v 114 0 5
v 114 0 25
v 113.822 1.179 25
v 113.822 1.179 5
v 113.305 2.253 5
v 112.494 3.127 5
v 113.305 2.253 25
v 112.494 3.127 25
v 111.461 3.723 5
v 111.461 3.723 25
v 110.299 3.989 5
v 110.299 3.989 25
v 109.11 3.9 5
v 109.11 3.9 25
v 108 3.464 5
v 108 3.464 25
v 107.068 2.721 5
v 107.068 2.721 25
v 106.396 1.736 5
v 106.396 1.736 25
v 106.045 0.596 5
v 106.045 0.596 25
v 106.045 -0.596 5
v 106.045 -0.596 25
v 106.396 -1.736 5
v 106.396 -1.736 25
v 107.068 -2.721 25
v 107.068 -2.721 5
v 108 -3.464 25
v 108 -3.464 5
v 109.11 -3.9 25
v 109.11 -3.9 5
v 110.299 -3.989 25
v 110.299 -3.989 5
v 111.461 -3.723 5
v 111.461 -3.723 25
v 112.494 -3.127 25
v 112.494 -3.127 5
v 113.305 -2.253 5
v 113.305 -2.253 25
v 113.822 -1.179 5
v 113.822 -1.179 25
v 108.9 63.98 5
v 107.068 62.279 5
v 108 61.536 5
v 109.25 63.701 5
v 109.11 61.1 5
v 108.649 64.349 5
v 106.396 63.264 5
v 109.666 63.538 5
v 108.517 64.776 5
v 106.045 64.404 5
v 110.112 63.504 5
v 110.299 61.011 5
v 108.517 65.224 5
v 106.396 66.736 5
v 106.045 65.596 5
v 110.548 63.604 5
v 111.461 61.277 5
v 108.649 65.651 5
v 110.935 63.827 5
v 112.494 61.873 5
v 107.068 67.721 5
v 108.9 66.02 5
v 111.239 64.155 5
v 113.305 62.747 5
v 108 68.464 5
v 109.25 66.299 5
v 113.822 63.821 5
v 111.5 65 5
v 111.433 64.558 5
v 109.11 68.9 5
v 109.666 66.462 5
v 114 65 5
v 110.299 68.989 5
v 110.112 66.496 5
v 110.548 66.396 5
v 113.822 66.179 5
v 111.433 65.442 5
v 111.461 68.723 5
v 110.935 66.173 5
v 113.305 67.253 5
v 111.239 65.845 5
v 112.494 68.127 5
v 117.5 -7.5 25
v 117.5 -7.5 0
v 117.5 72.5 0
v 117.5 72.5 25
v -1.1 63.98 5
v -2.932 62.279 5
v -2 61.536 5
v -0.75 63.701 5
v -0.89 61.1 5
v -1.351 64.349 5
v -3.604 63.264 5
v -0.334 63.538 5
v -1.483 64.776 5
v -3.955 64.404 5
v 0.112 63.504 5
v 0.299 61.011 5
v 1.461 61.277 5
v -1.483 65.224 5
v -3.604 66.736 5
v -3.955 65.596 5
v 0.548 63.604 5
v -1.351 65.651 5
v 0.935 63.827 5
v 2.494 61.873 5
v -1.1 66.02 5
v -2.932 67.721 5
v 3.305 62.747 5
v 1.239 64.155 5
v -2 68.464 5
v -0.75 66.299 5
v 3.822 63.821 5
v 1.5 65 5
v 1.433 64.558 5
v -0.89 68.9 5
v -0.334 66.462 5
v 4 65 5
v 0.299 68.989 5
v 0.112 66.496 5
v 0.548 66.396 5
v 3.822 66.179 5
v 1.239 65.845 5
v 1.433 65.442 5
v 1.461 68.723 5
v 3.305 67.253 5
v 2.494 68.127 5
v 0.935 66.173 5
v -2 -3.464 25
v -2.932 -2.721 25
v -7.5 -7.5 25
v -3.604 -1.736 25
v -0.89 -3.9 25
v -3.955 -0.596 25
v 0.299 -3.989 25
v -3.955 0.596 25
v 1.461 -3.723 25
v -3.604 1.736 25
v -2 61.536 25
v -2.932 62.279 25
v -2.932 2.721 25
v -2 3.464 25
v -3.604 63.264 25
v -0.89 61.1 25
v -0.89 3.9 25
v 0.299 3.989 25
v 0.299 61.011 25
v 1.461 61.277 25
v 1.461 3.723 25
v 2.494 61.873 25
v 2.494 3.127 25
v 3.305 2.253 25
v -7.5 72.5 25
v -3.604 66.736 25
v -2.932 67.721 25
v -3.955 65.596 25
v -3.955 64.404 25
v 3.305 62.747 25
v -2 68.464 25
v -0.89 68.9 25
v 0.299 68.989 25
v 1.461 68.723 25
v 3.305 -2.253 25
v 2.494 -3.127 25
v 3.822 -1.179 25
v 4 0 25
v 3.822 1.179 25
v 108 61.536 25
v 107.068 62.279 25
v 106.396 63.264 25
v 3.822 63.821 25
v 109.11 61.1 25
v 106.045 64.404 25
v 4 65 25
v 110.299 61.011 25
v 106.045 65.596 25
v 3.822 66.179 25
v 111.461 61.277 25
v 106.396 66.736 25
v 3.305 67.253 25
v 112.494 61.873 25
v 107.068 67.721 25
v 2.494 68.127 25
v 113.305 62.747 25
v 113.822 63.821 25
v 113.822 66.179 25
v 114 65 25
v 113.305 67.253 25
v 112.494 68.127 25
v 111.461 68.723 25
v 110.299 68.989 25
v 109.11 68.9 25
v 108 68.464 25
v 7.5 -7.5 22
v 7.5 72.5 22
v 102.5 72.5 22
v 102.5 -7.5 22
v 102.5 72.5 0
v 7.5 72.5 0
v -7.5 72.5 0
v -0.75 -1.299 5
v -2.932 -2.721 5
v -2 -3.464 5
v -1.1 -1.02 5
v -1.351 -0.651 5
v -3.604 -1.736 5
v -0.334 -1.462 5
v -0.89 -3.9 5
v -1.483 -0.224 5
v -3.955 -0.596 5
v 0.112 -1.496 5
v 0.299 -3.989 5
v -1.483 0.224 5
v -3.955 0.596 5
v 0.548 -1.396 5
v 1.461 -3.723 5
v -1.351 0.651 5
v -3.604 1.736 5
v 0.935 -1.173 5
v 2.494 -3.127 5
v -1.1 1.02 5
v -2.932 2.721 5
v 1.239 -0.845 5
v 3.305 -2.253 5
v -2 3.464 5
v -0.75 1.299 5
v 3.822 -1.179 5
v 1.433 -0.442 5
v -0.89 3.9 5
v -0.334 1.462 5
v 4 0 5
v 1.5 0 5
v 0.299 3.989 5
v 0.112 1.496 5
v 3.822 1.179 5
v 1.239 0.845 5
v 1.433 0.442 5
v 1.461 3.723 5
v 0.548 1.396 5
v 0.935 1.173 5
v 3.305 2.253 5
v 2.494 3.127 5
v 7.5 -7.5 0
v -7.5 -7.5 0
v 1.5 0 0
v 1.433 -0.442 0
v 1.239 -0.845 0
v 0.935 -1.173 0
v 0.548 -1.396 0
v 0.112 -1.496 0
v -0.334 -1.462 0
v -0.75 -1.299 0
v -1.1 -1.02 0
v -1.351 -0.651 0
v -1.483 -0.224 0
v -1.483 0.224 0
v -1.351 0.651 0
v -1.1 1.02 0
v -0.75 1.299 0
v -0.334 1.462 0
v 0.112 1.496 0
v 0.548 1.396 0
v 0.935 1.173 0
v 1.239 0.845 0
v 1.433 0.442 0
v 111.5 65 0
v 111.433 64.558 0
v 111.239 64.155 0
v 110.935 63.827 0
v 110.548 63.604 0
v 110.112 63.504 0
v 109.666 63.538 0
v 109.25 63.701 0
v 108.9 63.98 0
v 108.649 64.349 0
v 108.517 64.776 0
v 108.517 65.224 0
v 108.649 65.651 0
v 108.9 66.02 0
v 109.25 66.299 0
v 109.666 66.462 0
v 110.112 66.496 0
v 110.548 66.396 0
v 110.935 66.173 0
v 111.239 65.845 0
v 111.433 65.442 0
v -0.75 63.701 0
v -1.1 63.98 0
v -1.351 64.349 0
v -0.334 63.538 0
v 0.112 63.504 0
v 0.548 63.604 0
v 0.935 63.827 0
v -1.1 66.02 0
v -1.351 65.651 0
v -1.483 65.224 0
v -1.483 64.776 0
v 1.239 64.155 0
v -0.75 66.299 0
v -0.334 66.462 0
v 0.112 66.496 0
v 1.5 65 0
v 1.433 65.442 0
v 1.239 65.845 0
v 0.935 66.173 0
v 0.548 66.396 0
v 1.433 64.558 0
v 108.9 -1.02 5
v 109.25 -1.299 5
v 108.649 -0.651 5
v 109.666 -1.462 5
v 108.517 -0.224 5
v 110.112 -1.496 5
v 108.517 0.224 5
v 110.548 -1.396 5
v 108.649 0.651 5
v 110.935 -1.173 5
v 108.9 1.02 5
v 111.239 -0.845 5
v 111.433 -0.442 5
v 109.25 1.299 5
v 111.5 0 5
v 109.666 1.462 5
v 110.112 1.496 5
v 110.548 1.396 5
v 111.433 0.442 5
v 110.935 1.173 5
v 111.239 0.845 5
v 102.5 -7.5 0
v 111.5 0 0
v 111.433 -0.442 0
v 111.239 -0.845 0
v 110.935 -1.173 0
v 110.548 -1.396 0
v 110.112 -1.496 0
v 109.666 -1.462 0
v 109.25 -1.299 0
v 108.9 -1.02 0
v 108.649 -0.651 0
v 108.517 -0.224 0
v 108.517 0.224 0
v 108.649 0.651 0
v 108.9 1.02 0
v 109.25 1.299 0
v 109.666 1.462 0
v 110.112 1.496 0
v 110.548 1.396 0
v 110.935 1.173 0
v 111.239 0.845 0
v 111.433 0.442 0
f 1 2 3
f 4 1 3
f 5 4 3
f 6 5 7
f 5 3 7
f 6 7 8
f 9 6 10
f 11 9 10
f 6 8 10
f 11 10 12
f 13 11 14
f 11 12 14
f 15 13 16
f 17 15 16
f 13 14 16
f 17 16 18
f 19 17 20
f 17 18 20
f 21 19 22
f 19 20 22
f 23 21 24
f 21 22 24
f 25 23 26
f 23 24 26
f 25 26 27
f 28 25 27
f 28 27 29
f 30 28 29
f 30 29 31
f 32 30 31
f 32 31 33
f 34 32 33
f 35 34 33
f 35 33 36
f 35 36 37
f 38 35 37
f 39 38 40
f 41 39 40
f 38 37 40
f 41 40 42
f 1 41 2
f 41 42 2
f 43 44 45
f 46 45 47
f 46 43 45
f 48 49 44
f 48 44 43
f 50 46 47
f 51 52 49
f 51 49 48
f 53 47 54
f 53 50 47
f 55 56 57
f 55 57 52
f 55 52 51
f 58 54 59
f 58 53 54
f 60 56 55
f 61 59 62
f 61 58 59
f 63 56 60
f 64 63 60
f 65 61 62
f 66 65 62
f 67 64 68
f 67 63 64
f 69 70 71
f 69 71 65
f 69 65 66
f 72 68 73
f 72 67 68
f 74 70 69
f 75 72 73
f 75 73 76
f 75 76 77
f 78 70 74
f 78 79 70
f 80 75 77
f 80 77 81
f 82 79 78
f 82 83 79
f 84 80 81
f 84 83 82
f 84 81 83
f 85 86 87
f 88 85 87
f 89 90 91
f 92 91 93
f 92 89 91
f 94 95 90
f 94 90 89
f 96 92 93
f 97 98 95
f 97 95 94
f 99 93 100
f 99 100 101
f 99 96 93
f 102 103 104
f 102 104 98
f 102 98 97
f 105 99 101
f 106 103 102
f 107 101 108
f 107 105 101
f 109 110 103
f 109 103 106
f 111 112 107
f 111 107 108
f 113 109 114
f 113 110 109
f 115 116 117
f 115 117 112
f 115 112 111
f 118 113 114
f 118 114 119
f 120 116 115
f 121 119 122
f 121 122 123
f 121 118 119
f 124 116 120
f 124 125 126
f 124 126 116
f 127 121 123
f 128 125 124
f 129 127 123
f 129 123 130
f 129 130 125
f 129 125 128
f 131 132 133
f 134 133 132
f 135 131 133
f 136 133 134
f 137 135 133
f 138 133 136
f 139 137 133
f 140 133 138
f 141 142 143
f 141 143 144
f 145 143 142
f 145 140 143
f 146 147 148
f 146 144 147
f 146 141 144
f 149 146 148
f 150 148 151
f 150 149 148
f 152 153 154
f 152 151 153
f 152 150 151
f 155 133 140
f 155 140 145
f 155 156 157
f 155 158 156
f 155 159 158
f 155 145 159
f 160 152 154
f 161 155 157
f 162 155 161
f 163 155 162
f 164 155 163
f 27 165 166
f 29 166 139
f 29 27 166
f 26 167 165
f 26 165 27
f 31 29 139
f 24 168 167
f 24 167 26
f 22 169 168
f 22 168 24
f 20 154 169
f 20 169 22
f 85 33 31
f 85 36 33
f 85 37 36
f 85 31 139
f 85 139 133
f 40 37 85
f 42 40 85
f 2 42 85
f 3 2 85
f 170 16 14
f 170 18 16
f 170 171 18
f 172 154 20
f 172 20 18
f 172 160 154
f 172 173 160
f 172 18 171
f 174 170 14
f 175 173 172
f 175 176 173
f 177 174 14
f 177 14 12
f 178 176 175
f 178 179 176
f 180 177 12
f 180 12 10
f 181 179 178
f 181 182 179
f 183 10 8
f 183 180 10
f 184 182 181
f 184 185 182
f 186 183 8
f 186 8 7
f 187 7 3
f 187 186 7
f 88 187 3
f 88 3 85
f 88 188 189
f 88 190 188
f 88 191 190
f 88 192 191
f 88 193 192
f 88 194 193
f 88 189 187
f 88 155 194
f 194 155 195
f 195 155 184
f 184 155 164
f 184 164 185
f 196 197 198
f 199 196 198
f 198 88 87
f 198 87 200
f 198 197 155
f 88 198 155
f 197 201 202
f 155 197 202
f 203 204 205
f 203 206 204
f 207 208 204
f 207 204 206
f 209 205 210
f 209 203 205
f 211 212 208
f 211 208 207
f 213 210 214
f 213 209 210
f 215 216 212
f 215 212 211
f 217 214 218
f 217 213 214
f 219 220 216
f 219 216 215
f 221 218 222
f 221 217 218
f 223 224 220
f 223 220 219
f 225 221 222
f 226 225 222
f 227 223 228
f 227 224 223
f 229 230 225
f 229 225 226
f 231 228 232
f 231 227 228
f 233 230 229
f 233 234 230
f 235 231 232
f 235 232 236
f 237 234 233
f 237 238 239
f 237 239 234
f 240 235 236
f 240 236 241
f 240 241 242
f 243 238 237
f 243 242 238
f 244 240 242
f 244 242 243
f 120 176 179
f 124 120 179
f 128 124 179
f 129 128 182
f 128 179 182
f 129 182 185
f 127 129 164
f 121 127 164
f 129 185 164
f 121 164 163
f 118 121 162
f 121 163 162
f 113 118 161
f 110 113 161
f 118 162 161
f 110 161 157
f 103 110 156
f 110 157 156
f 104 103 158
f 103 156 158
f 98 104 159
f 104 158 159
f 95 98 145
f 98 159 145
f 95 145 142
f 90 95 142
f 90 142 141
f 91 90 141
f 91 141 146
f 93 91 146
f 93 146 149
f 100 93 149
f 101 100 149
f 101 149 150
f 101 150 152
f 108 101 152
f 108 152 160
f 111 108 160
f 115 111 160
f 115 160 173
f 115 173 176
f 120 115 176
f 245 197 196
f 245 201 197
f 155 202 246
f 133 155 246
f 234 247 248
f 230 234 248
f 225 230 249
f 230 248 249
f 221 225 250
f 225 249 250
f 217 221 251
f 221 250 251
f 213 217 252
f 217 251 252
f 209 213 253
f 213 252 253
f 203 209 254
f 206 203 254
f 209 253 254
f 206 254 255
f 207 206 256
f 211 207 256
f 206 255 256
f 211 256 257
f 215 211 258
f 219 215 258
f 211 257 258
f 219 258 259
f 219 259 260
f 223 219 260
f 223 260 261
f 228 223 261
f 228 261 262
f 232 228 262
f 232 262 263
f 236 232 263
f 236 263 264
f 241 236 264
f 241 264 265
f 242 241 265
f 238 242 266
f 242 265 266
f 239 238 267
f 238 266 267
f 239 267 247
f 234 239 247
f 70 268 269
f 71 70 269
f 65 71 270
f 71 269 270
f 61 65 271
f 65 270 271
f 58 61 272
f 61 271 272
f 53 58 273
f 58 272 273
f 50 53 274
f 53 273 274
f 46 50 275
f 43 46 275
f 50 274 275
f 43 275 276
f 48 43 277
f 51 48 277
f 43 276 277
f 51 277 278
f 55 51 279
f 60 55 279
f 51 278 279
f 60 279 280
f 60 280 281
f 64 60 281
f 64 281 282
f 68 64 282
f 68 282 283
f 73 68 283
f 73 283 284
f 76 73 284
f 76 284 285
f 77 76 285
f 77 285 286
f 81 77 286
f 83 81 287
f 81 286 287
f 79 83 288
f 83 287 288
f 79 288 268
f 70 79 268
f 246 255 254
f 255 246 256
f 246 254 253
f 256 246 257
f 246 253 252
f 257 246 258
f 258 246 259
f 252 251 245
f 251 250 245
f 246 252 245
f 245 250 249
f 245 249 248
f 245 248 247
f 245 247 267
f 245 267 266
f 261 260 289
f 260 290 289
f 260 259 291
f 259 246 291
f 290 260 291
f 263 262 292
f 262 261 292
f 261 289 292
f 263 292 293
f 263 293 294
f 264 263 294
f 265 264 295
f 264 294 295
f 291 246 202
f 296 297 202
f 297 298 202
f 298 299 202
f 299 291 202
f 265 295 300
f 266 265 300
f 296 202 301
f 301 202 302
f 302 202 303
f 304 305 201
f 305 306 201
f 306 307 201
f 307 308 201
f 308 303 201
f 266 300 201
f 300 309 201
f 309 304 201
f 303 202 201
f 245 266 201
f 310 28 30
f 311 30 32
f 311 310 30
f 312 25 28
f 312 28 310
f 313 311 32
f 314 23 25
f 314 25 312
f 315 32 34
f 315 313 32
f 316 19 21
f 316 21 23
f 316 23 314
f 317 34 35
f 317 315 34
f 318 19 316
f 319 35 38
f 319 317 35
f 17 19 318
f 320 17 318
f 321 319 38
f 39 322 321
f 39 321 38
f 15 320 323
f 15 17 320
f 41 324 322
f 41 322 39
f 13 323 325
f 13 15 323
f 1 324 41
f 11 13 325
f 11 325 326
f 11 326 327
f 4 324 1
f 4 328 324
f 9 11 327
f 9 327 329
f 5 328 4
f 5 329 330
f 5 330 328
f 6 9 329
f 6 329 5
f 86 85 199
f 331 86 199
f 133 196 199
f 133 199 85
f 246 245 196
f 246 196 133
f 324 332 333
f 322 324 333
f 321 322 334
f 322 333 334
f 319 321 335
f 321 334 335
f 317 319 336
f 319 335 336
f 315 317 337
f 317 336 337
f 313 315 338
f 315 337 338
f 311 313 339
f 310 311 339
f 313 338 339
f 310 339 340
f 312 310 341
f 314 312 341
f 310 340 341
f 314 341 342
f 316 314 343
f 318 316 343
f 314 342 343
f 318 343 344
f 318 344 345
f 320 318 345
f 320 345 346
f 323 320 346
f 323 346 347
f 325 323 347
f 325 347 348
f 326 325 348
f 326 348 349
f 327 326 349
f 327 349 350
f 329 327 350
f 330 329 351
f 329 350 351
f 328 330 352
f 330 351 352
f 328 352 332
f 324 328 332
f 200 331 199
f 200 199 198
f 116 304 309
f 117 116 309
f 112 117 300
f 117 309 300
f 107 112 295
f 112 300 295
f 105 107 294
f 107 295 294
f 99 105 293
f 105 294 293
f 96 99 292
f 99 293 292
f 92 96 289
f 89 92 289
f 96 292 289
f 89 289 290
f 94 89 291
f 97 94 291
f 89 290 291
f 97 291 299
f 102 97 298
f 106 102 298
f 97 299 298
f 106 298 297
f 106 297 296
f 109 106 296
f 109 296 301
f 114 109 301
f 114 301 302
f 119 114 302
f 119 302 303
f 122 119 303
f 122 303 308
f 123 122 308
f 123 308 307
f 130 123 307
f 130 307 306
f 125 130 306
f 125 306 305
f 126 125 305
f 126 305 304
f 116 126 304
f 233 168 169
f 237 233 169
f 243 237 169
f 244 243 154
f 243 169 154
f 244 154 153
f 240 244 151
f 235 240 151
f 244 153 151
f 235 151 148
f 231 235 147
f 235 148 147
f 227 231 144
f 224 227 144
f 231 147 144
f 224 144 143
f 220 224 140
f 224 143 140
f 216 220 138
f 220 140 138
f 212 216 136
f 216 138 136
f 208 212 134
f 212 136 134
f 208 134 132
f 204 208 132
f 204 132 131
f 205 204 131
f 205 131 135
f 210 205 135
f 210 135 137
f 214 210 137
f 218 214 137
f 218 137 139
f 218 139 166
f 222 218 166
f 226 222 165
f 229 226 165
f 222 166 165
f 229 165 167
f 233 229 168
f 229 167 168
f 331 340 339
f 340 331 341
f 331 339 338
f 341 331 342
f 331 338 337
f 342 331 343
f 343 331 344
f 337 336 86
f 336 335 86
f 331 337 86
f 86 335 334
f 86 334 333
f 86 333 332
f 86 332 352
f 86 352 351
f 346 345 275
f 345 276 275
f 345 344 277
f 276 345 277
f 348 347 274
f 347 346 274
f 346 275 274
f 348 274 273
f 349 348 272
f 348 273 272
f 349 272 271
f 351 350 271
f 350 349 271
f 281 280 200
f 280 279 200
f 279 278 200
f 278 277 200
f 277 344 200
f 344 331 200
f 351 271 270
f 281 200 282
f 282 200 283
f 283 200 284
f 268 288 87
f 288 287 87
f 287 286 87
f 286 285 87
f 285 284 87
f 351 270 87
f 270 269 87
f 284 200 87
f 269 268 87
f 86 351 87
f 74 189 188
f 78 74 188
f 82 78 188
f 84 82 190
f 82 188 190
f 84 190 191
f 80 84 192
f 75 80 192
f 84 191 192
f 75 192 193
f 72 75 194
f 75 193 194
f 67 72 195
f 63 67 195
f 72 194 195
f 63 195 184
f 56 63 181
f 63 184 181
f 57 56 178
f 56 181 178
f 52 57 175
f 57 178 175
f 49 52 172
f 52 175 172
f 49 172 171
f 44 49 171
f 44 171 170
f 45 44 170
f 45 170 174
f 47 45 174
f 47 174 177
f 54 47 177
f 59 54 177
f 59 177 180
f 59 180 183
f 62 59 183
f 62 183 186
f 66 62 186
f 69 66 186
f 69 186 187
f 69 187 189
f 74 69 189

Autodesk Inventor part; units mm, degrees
ref_plane "YZ Plane" through (0, 0, 0) normal (1, 0, 0) x (0, 1, 0)
ref_plane "XZ Plane" through (0, 0, 0) normal (0, 1, 0) x (-1, 0, 0)
ref_plane "XY Plane" through (0, 0, 0) normal (0, 0, 1) x (1, 0, 0)
sketch "Sketch1" plane through (0, 0, 0) normal (0, 0, 1) x (1, 0, 0)
  line L0 (0, 0) -> (110, 0) construction
  line L1 (110, 0) -> (110, 65) construction
  line L2 (110, 65) -> (0, 65) construction
  line L3 (0, 65) -> (0, 0) construction
  circle A0 centre (0, 65) radius 1.5
  circle A1 centre (0, 0) radius 1.5
  circle A2 centre (110, 0) radius 1.5
  circle A3 centre (110, 65) radius 1.5
  line L4 (-7.5, 72.5) -> (7.5, 72.5)
  line L5 (7.5, 72.5) -> (7.5, -7.5)
  line L6 (7.5, -7.5) -> (-7.5, -7.5)
  line L7 (-7.5, -7.5) -> (-7.5, 72.5)
  line L8 (102.5, 72.5) -> (117.5, 72.5)
  line L9 (117.5, 72.5) -> (117.5, -7.5)
  line L10 (117.5, -7.5) -> (102.5, -7.5)
  line L11 (102.5, -7.5) -> (102.5, 72.5)
  point P0 (7.5, 32.5)
  point P1 (0, 32.5)
  point P2 (102.5, 32.5)
  point P3 (110, 32.5)
  point P4 (0, 72.5)
  point P5 (110, 72.5)
  dimension "d0" = 110
  dimension "d1" = 65
  dimension "d2" = 3
  dimension "d3" = 3
  dimension "d4" = 3
  dimension "d5" = 3
  dimension "d6" = 15
  dimension "d7" = 15
  dimension "d8" = 80
extrude "Extrusion1" add sketch "Sketch1" along normal blind 22
sketch "Sketch2" plane through (0, 0, 22) normal (0, 0, 1) x (1, 0, 0)
  circle A0 centre (0, 65) radius 1.5 projected
  circle A1 centre (0, 0) radius 1.5 projected
  circle A2 centre (110, 0) radius 1.5 projected
  circle A3 centre (110, 65) radius 1.5 projected
  line L0 (-7.5, 72.5) -> (-7.5, -7.5) projected
  line L1 (7.5, 72.5) -> (-7.5, 72.5) projected
  line L2 (102.5, -7.5) -> (117.5, -7.5) projected
  line L3 (117.5, -7.5) -> (117.5, 72.5) projected
  line L4 (-7.5, 72.5) -> (117.5, 72.5)
  line L5 (117.5, 72.5) -> (117.5, -7.5)
  line L6 (117.5, -7.5) -> (-7.5, -7.5)
  line L7 (-7.5, -7.5) -> (-7.5, 72.5)
extrude "Extrusion2" add sketch "Sketch2" along normal blind 3
sketch "Sketch3" plane through (0, 0, 25) normal (0, 0, 1) x (1, 0, 0)
  circle A0 centre (0, 65) radius 1.5 projected
  circle A1 centre (110, 65) radius 1.5 projected
  circle A2 centre (110, 0) radius 1.5 projected
  circle A3 centre (0, 0) radius 1.5 projected
  circle A4 centre (0, 65) radius 1.5 projected
  circle A5 centre (0, 65) radius 4
  circle A6 centre (0, 0) radius 1.5 projected
  circle A7 centre (0, 0) radius 4
  circle A8 centre (110, 0) radius 1.5 projected
  circle A9 centre (110, 0) radius 4
  circle A10 centre (110, 65) radius 4
  dimension "d13" = 8
  dimension "d14" = 8
  dimension "d15" = 8
  dimension "d16" = 8
extrude "Extrusion3" cut sketch "Sketch3" against normal blind 20 contours A0 | A1 | A2 | A3 | A5 | A7 | A9 | A10
properties part number "BP010" material "ABS Plastic"
